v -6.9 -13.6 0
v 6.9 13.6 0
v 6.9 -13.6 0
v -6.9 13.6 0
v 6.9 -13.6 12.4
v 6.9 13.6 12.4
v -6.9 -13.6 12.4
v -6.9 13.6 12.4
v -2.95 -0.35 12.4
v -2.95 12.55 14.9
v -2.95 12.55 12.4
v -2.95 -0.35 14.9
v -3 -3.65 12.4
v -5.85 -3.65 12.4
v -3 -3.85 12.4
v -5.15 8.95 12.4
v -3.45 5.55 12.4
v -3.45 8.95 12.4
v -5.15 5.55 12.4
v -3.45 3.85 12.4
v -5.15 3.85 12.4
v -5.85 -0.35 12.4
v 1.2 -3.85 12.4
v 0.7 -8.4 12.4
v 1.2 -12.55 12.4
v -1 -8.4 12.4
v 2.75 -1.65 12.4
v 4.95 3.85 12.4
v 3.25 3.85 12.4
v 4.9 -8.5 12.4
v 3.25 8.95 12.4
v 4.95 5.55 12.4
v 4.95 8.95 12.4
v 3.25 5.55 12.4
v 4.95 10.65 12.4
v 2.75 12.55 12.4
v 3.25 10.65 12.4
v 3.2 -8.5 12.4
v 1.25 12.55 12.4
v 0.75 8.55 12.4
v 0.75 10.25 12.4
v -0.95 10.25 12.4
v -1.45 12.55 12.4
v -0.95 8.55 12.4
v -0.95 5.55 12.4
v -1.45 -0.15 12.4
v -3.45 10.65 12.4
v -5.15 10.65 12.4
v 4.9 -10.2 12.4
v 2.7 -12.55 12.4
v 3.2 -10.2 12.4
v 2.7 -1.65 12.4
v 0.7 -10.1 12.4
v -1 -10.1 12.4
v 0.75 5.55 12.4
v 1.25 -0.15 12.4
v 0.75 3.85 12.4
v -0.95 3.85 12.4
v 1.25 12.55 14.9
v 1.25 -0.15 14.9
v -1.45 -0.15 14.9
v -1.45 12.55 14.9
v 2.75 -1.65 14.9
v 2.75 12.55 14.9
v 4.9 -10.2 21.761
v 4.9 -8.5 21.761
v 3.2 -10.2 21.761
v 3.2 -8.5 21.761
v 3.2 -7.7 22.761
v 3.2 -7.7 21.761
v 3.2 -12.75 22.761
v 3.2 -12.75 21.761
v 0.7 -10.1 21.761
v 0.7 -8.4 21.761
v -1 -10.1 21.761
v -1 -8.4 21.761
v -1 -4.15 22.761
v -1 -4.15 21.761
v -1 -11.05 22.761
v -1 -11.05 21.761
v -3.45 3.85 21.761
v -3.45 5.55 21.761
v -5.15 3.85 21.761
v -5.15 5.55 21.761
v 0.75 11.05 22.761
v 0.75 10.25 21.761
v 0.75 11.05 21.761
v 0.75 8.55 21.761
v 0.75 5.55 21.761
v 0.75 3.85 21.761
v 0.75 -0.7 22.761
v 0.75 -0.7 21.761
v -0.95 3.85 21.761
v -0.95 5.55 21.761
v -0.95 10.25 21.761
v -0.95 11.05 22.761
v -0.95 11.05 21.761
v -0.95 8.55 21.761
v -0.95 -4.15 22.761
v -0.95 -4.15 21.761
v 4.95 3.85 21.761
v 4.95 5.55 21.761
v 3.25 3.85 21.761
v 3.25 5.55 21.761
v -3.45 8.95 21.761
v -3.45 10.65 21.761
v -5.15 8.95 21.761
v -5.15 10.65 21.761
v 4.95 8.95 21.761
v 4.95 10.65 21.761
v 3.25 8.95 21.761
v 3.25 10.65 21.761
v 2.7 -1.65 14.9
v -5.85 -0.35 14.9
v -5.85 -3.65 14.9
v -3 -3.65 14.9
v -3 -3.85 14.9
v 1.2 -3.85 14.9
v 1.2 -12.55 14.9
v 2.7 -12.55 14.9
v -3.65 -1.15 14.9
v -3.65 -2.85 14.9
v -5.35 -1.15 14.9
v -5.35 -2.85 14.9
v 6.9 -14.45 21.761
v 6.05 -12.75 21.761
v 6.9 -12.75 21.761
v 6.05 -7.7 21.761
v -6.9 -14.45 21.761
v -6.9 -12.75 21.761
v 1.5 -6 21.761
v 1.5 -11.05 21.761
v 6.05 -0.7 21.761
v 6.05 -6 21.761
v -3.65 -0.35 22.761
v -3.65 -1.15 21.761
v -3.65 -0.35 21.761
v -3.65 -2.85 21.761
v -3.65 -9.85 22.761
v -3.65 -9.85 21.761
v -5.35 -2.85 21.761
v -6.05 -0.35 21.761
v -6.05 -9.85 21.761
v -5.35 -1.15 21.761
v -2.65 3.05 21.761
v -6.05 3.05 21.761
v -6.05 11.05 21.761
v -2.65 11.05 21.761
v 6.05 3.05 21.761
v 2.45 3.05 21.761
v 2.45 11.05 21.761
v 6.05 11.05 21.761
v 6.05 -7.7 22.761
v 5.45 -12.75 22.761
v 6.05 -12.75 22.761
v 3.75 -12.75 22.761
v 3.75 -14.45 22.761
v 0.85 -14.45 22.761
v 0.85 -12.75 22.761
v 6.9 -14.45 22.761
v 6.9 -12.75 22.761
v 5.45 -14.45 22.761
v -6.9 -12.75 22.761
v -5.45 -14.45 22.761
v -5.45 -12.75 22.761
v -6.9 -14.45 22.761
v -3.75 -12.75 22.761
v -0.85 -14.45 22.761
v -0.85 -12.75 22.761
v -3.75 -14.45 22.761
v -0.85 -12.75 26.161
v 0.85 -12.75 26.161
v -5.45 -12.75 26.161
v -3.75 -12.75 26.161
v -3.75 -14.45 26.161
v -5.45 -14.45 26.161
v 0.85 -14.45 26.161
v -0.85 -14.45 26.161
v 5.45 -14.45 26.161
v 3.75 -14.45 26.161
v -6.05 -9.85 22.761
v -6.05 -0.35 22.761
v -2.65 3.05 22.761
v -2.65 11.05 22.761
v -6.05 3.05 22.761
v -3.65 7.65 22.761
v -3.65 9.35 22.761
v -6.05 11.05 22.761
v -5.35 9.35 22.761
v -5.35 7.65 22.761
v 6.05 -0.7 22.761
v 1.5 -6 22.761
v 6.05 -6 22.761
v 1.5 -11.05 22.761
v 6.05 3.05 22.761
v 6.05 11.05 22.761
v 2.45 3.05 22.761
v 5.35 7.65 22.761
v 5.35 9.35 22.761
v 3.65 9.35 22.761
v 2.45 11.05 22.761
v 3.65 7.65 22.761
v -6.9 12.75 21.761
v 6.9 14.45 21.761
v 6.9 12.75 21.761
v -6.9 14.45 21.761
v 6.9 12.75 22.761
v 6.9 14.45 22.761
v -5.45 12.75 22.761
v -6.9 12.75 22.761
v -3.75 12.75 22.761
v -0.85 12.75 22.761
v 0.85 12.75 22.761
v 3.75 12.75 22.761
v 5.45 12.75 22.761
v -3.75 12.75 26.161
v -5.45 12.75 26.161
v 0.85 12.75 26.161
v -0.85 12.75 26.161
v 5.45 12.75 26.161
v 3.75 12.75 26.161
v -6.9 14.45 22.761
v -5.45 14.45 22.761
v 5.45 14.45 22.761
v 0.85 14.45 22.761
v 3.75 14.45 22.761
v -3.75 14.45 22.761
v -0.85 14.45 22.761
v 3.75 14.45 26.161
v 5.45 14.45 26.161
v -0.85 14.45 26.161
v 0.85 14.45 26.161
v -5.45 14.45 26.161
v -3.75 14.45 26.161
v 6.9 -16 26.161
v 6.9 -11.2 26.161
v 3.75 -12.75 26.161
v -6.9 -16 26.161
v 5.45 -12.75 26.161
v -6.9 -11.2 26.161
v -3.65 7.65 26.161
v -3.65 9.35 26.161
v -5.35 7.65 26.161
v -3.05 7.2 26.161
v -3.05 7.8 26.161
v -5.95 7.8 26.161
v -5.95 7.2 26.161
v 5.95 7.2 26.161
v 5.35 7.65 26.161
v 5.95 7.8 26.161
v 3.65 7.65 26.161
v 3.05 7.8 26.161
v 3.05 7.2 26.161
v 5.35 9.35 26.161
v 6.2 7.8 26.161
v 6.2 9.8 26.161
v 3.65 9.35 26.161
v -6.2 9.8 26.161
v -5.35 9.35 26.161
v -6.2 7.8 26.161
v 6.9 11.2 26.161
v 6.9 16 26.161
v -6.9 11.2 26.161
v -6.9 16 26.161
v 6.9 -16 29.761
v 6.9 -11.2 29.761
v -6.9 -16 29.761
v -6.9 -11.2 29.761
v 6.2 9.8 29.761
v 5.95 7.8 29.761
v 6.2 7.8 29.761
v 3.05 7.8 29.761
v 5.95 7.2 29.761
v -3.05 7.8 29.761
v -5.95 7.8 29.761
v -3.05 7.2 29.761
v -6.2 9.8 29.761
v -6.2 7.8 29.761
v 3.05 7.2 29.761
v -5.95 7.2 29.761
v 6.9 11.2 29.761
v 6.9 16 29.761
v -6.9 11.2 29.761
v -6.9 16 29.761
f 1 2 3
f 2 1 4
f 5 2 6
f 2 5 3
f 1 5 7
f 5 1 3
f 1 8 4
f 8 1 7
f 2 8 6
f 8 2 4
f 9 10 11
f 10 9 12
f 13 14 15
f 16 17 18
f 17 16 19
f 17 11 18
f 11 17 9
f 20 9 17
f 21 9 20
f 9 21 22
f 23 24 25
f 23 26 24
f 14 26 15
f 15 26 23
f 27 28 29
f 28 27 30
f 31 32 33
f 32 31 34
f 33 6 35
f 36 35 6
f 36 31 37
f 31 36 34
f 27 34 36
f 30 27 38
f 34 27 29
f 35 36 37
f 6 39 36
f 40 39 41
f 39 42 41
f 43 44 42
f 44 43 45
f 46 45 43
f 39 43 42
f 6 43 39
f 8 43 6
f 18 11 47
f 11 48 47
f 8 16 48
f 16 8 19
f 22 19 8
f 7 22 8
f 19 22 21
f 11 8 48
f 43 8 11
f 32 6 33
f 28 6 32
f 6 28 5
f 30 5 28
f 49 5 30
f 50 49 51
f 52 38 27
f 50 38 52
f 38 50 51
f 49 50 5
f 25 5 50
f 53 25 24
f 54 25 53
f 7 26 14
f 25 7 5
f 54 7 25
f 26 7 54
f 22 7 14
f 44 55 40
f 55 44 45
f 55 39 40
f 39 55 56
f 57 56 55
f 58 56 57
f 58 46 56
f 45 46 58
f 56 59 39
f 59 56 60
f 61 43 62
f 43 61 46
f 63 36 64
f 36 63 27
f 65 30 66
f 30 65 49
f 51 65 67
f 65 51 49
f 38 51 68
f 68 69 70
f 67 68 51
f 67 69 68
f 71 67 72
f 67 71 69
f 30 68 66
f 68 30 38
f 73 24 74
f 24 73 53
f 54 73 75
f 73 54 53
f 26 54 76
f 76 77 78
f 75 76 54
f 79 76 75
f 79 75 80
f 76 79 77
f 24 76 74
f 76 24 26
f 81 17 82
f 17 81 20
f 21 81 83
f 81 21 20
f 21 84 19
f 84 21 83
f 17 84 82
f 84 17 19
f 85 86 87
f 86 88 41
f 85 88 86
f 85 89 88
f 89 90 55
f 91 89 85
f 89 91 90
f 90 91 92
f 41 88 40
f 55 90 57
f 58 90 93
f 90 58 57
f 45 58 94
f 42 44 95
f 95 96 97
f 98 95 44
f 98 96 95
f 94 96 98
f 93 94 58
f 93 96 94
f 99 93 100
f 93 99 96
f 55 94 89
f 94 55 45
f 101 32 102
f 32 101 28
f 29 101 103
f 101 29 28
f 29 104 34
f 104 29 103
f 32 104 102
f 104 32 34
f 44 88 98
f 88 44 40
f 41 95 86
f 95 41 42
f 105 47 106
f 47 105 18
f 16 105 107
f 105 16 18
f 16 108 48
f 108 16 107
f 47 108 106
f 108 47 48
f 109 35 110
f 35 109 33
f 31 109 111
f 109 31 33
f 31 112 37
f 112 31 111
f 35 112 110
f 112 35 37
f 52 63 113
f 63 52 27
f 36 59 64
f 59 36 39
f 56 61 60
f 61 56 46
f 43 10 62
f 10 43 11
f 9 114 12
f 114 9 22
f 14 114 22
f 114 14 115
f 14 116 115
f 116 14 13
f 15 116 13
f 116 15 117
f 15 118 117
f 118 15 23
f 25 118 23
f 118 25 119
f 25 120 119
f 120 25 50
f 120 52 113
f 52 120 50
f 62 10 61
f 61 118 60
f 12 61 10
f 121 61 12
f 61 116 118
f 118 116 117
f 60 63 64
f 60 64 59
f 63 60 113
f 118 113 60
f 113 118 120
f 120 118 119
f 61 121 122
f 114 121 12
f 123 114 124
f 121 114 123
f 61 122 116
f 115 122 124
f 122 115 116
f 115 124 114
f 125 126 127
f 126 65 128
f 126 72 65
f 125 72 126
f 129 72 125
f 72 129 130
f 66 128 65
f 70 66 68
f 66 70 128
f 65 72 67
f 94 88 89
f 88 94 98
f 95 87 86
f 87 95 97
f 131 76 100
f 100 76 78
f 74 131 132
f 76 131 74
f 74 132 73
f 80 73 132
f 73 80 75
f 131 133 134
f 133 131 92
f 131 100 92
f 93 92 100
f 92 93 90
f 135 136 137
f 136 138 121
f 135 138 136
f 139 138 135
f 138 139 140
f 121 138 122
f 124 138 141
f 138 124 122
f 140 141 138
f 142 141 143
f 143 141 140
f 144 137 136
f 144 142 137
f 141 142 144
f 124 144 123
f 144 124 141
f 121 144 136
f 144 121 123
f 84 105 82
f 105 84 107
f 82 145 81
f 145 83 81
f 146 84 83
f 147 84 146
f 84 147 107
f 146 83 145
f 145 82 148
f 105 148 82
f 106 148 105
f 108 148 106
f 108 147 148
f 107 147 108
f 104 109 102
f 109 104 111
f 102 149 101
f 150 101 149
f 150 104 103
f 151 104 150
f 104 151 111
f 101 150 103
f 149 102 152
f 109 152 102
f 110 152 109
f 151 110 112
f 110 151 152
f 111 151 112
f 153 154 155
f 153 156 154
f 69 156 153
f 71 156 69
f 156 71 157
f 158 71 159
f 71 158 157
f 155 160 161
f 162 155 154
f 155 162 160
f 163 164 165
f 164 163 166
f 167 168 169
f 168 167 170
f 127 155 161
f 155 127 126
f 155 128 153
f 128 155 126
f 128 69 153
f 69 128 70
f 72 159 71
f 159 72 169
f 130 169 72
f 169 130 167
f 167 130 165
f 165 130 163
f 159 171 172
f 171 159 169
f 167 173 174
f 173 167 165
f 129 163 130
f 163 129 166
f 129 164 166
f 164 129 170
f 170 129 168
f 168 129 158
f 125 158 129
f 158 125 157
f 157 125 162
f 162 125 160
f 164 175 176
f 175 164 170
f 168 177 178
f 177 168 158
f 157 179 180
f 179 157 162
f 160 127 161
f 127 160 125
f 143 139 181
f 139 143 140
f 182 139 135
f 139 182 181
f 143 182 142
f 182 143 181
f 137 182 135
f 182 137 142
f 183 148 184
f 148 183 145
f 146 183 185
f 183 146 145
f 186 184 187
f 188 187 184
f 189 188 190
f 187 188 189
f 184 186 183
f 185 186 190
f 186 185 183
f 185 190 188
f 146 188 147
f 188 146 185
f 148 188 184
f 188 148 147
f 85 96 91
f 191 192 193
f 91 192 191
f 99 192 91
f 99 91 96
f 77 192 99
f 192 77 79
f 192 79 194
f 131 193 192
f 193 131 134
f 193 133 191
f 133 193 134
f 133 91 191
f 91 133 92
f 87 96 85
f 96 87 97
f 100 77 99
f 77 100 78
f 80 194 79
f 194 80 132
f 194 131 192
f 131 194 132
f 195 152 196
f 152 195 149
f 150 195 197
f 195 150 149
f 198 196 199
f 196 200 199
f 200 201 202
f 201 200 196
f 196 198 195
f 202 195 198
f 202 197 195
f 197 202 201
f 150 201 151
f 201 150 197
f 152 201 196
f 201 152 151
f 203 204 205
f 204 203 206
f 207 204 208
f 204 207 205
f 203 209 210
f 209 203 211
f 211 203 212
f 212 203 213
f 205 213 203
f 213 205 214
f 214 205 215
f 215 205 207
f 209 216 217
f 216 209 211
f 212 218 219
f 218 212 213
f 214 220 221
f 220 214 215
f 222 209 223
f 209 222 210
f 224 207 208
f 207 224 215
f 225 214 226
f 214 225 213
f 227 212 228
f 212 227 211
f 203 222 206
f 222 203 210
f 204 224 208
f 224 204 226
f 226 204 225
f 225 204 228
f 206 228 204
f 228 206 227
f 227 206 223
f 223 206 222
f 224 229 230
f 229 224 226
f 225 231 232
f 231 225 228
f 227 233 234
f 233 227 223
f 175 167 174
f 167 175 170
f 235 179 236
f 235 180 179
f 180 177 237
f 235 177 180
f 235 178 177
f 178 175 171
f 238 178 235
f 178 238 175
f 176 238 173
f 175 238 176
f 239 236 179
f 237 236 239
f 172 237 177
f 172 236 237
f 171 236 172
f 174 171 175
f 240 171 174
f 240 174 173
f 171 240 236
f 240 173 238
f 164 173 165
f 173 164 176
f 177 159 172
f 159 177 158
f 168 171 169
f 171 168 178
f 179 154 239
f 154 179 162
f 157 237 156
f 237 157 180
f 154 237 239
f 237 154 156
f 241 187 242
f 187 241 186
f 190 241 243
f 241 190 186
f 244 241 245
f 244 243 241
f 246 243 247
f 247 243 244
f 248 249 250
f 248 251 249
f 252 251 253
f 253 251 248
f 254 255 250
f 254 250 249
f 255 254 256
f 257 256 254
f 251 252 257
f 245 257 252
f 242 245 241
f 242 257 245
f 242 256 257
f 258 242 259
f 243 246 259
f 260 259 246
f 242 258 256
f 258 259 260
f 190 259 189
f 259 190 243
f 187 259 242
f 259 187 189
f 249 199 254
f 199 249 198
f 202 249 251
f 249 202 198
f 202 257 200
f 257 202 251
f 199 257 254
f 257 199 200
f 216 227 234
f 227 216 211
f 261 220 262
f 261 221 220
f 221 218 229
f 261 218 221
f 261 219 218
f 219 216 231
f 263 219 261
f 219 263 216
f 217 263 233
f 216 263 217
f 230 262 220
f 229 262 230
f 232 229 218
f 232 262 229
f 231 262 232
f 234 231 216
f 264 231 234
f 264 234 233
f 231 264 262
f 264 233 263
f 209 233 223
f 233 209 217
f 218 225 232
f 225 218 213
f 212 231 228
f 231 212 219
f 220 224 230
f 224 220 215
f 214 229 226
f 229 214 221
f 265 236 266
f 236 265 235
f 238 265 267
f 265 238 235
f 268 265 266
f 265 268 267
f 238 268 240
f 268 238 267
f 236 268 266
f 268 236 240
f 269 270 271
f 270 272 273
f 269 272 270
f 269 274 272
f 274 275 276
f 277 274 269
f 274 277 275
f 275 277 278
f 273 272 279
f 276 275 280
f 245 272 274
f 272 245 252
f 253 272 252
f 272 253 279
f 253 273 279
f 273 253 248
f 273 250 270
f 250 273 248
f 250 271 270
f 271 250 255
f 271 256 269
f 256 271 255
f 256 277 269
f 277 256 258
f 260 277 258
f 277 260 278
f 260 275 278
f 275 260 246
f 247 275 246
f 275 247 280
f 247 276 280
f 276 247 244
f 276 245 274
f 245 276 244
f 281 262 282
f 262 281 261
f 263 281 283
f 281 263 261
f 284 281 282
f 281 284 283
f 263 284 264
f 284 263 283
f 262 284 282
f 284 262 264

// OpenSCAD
// Generated by SolidPython 0.4.2 on 2020-09-29 23:21:03
//!OpenSCAD

scale(v = 0.0100000000) {
	translate(v = [-690, -1360, 0]) {
		union() {
			color(c = [0.4000000000, 0.4000000000, 0.4000000000]) {
				translate(v = [0, 0, 0]) {
					linear_extrude(height = 1000.0000000000) {
						polygon(paths = [[0, 1, 2, 3]], points = [[0, 0], [0, 2720], [1380, 2720], [1380, 0]]);
					}
				}
			}
			color(c = [0.2000000000, 0.6000000000, 0.2000000000]) {
				translate(v = [0, 0, 1000.0000000000]) {
					linear_extrude(height = 120.0000000000) {
						polygon(paths = [[0, 1, 2, 3]], points = [[0, 1305], [0, 2720], [1380, 2720], [1380, 1305]]);
					}
				}
			}
			color(c = [0.4000000000, 0.4000000000, 0.4000000000]) {
				translate(v = [0, 0, 1000.0000000000]) {
					linear_extrude(height = 120.0000000000) {
						polygon(paths = [[0, 1, 2, 3]], points = [[0, 0], [0, 1305], [1380, 1305], [1380, 0]]);
					}
				}
			}
			color(c = [0.9000000000, 0.6000000000, 0.6000000000]) {
				translate(v = [0, 0, 1120.0000000000]) {
					linear_extrude(height = 120.0000000000) {
						polygon(paths = [[0, 1, 2, 3]], points = [[135, 1645], [135, 2485], [395, 2485], [395, 1645]]);
					}
				}
			}
			color(c = [0.9000000000, 0.6000000000, 0.6000000000]) {
				translate(v = [0, 0, 1120.0000000000]) {
					linear_extrude(height = 120.0000000000) {
						polygon(paths = [[0, 1, 2, 3]], points = [[545, 1645], [545, 2485], [815, 2485], [815, 1645]]);
					}
				}
			}
			color(c = [0.9000000000, 0.6000000000, 0.6000000000]) {
				translate(v = [0, 0, 1120.0000000000]) {
					linear_extrude(height = 120.0000000000) {
						polygon(paths = [[0, 1, 2, 3]], points = [[965, 1645], [965, 2485], [1245, 2485], [1245, 1645]]);
					}
				}
			}
			color(c = [0.9000000000, 0.6000000000, 0.9000000000]) {
				translate(v = [0, 0, 1120.0000000000]) {
					linear_extrude(height = 120.0000000000) {
						polygon(paths = [[0, 1, 2, 3]], points = [[550, 235], [550, 655], [810, 655], [810, 235]]);
					}
				}
			}
			color(c = [0.9000000000, 0.6000000000, 0.9000000000]) {
				translate(v = [0, 0, 1120.0000000000]) {
					linear_extrude(height = 120.0000000000) {
						polygon(paths = [[0, 1, 2, 3]], points = [[960, 235], [960, 655], [1245, 655], [1245, 235]]);
					}
				}
			}
			color(c = [0.2000000000, 0.6000000000, 0.2000000000]) {
				translate(v = [0, 0, 1120.0000000000]) {
					linear_extrude(height = 120.0000000000) {
						difference() {
							polygon(paths = [[0, 1, 2, 3]], points = [[0, 1305], [0, 2720], [1380, 2720], [1380, 1305]]);
							polygon(paths = [[0, 1, 2, 3]], points = [[135, 1645], [395, 1645], [395, 2485], [135, 2485]]);
							polygon(paths = [[0, 1, 2, 3]], points = [[545, 1645], [815, 1645], [815, 2485], [545, 2485]]);
							polygon(paths = [[0, 1, 2, 3]], points = [[965, 1645], [1245, 1645], [1245, 2485], [965, 2485]]);
						}
					}
				}
			}
			color(c = [0.4000000000, 0.4000000000, 0.4000000000]) {
				translate(v = [0, 0, 1120.0000000000]) {
					linear_extrude(height = 120.0000000000) {
						difference() {
							polygon(paths = [[0, 1, 2, 3]], points = [[0, 0], [0, 1305], [1380, 1305], [1380, 0]]);
							polygon(paths = [[0, 1, 2, 3]], points = [[550, 235], [810, 235], [810, 655], [550, 655]]);
							polygon(paths = [[0, 1, 2, 3]], points = [[960, 235], [1245, 235], [1245, 655], [960, 655]]);
						}
					}
				}
			}
			color(c = [0.1000000000, 0.1000000000, 0.1000000000]) {
				translate(v = [0, 0, 1240.0000000000]) {
					linear_extrude(height = 70.0000000000) {
						polygon(paths = [[0, 1, 2, 3]], points = [[1010, 340], [1010, 510], [1180, 510], [1180, 340]]);
					}
				}
			}
			color(c = [0.1000000000, 0.1000000000, 0.1000000000]) {
				translate(v = [0, 0, 1240.0000000000]) {
					linear_extrude(height = 70.0000000000) {
						polygon(paths = [[0, 1, 2, 3]], points = [[590, 350], [590, 520], [760, 520], [760, 350]]);
					}
				}
			}
			color(c = [0.1000000000, 0.1000000000, 0.1000000000]) {
				translate(v = [0, 0, 1240.0000000000]) {
					linear_extrude(height = 70.0000000000) {
						polygon(paths = [[0, 1, 2, 3]], points = [[175, 1745], [175, 1915], [345, 1915], [345, 1745]]);
					}
				}
			}
			color(c = [0.1000000000, 0.1000000000, 0.1000000000]) {
				translate(v = [0, 0, 1240.0000000000]) {
					linear_extrude(height = 70.0000000000) {
						polygon(paths = [[0, 1, 2, 3]], points = [[595, 1745], [595, 1915], [765, 1915], [765, 1745]]);
					}
				}
			}
			color(c = [0.1000000000, 0.1000000000, 0.1000000000]) {
				translate(v = [0, 0, 1240.0000000000]) {
					linear_extrude(height = 70.0000000000) {
						polygon(paths = [[0, 1, 2, 3]], points = [[1015, 1745], [1015, 1915], [1185, 1915], [1185, 1745]]);
					}
				}
			}
			color(c = [0.1000000000, 0.1000000000, 0.1000000000]) {
				translate(v = [0, 0, 1240.0000000000]) {
					linear_extrude(height = 70.0000000000) {
						polygon(paths = [[0, 1, 2, 3]], points = [[595, 2215], [595, 2385], [765, 2385], [765, 2215]]);
					}
				}
			}
			color(c = [0.1000000000, 0.1000000000, 0.1000000000]) {
				translate(v = [0, 0, 1240.0000000000]) {
					linear_extrude(height = 70.0000000000) {
						polygon(paths = [[0, 1, 2, 3]], points = [[175, 2255], [175, 2425], [345, 2425], [345, 2255]]);
					}
				}
			}
			color(c = [0.1000000000, 0.1000000000, 0.1000000000]) {
				translate(v = [0, 0, 1240.0000000000]) {
					linear_extrude(height = 70.0000000000) {
						polygon(paths = [[0, 1, 2, 3]], points = [[1015, 2255], [1015, 2425], [1185, 2425], [1185, 2255]]);
					}
				}
			}
			color(c = [1.0000000000, 1.0000000000, 1.0000000000]) {
				translate(v = [0, 0, 1240.0000000000]) {
					linear_extrude(height = 70.0000000000) {
						polygon(paths = [[0, 1, 2, 3, 4, 5, 6, 7, 8, 9, 10, 11, 12, 13, 14, 15]], points = [[810, 105], [810, 975], [390, 975], [390, 995], [105, 995], [105, 1325], [395, 1325], [395, 2615], [545, 2615], [545, 1345], [815, 1345], [815, 2615], [965, 2615], [965, 1195], [960, 1195], [960, 105]]);
					}
				}
			}
			color(c = [0.1000000000, 0.1000000000, 0.1000000000]) {
				translate(v = [0, 0, 1310.0000000000]) {
					linear_extrude(height = 180.0000000000) {
						polygon(paths = [[0, 1, 2, 3]], points = [[1010, 340], [1010, 510], [1180, 510], [1180, 340]]);
					}
				}
			}
			color(c = [0.1000000000, 0.1000000000, 0.1000000000]) {
				translate(v = [0, 0, 1310.0000000000]) {
					linear_extrude(height = 180.0000000000) {
						polygon(paths = [[0, 1, 2, 3]], points = [[590, 350], [590, 520], [760, 520], [760, 350]]);
					}
				}
			}
			color(c = [0.1000000000, 0.1000000000, 0.1000000000]) {
				translate(v = [0, 0, 1310.0000000000]) {
					linear_extrude(height = 180.0000000000) {
						polygon(paths = [[0, 1, 2, 3]], points = [[175, 1745], [175, 1915], [345, 1915], [345, 1745]]);
					}
				}
			}
			color(c = [0.1000000000, 0.1000000000, 0.1000000000]) {
				translate(v = [0, 0, 1310.0000000000]) {
					linear_extrude(height = 180.0000000000) {
						polygon(paths = [[0, 1, 2, 3]], points = [[595, 1745], [595, 1915], [765, 1915], [765, 1745]]);
					}
				}
			}
			color(c = [0.1000000000, 0.1000000000, 0.1000000000]) {
				translate(v = [0, 0, 1310.0000000000]) {
					linear_extrude(height = 180.0000000000) {
						polygon(paths = [[0, 1, 2, 3]], points = [[1015, 1745], [1015, 1915], [1185, 1915], [1185, 1745]]);
					}
				}
			}
			color(c = [0.1000000000, 0.1000000000, 0.1000000000]) {
				translate(v = [0, 0, 1310.0000000000]) {
					linear_extrude(height = 180.0000000000) {
						polygon(paths = [[0, 1, 2, 3]], points = [[595, 2215], [595, 2385], [765, 2385], [765, 2215]]);
					}
				}
			}
			color(c = [0.1000000000, 0.1000000000, 0.1000000000]) {
				translate(v = [0, 0, 1310.0000000000]) {
					linear_extrude(height = 180.0000000000) {
						polygon(paths = [[0, 1, 2, 3]], points = [[175, 2255], [175, 2425], [345, 2425], [345, 2255]]);
					}
				}
			}
			color(c = [0.1000000000, 0.1000000000, 0.1000000000]) {
				translate(v = [0, 0, 1310.0000000000]) {
					linear_extrude(height = 180.0000000000) {
						polygon(paths = [[0, 1, 2, 3]], points = [[1015, 2255], [1015, 2425], [1185, 2425], [1185, 2255]]);
					}
				}
			}
			color(c = [0.7000000000, 0, 0]) {
				translate(v = [0, 0, 1310.0000000000]) {
					linear_extrude(height = 180.0000000000) {
						polygon(paths = [[0, 1, 2, 3, 4, 5, 6, 7, 8, 9, 10, 11, 12, 13, 14, 15]], points = [[810, 105], [810, 975], [390, 975], [390, 995], [105, 995], [105, 1325], [395, 1325], [395, 2615], [545, 2615], [545, 1345], [815, 1345], [815, 2615], [965, 2615], [965, 1195], [960, 1195], [960, 105]]);
					}
				}
			}
			color(c = [0.1000000000, 0.1000000000, 0.1000000000]) {
				translate(v = [0, 0, 1490.0000000000]) {
					linear_extrude(height = 686.1000000000) {
						polygon(paths = [[0, 1, 2, 3]], points = [[1010, 340], [1010, 510], [1180, 510], [1180, 340]]);
					}
				}
			}
			color(c = [0.1000000000, 0.1000000000, 0.1000000000]) {
				translate(v = [0, 0, 1490.0000000000]) {
					linear_extrude(height = 686.1000000000) {
						polygon(paths = [[0, 1, 2, 3]], points = [[590, 350], [590, 520], [760, 520], [760, 350]]);
					}
				}
			}
			color(c = [0.1000000000, 0.1000000000, 0.1000000000]) {
				translate(v = [0, 0, 1490.0000000000]) {
					linear_extrude(height = 686.1000000000) {
						polygon(paths = [[0, 1, 2, 3]], points = [[155, 1075], [155, 1245], [325, 1245], [325, 1075]]);
					}
				}
			}
			color(c = [0.1000000000, 0.1000000000, 0.1000000000]) {
				translate(v = [0, 0, 1490.0000000000]) {
					linear_extrude(height = 686.1000000000) {
						polygon(paths = [[0, 1, 2, 3]], points = [[175, 1745], [175, 1915], [345, 1915], [345, 1745]]);
					}
				}
			}
			color(c = [0.1000000000, 0.1000000000, 0.1000000000]) {
				translate(v = [0, 0, 1490.0000000000]) {
					linear_extrude(height = 686.1000000000) {
						polygon(paths = [[0, 1, 2, 3]], points = [[595, 1745], [595, 1915], [765, 1915], [765, 1745]]);
					}
				}
			}
			color(c = [0.1000000000, 0.1000000000, 0.1000000000]) {
				translate(v = [0, 0, 1490.0000000000]) {
					linear_extrude(height = 686.1000000000) {
						polygon(paths = [[0, 1, 2, 3]], points = [[1015, 1745], [1015, 1915], [1185, 1915], [1185, 1745]]);
					}
				}
			}
			color(c = [0.1000000000, 0.1000000000, 0.1000000000]) {
				translate(v = [0, 0, 1490.0000000000]) {
					linear_extrude(height = 686.1000000000) {
						polygon(paths = [[0, 1, 2, 3]], points = [[595, 2215], [595, 2385], [765, 2385], [765, 2215]]);
					}
				}
			}
			color(c = [0.1000000000, 0.1000000000, 0.1000000000]) {
				translate(v = [0, 0, 1490.0000000000]) {
					linear_extrude(height = 686.1000000000) {
						polygon(paths = [[0, 1, 2, 3]], points = [[175, 2255], [175, 2425], [345, 2425], [345, 2255]]);
					}
				}
			}
			color(c = [0.1000000000, 0.1000000000, 0.1000000000]) {
				translate(v = [0, 0, 1490.0000000000]) {
					linear_extrude(height = 686.1000000000) {
						polygon(paths = [[0, 1, 2, 3]], points = [[1015, 2255], [1015, 2425], [1185, 2425], [1185, 2255]]);
					}
				}
			}
			color(c = [0.9000000000, 0.6000000000, 0.6000000000]) {
				translate(v = [0, 0, 2176.1000000000]) {
					linear_extrude(height = 100.0000000000) {
						polygon(paths = [[0, 1, 2, 3, 4, 5, 6, 7]], points = [[0, -85], [0, 85], [1010, 85], [1010, 590], [1295, 590], [1295, 85], [1380, 85], [1380, -85]]);
					}
				}
			}
			color(c = [0.9000000000, 0.6000000000, 0.6000000000]) {
				translate(v = [0, 0, 2176.1000000000]) {
					linear_extrude(height = 100.0000000000) {
						polygon(paths = [[0, 1, 2, 3]], points = [[85, 375], [85, 1325], [325, 1325], [325, 375]]);
					}
				}
			}
			color(c = [0.9000000000, 0.6000000000, 0.6000000000]) {
				translate(v = [0, 0, 2176.1000000000]) {
					linear_extrude(height = 100.0000000000) {
						polygon(paths = [[0, 1, 2, 3]], points = [[85, 1665], [85, 2465], [425, 2465], [425, 1665]]);
					}
				}
			}
			color(c = [0.9000000000, 0.6000000000, 0.6000000000]) {
				translate(v = [0, 0, 2176.1000000000]) {
					linear_extrude(height = 100.0000000000) {
						polygon(paths = [[0, 1, 2, 3, 4, 5, 6, 7, 8, 9]], points = [[590, 255], [590, 945], [595, 945], [595, 2465], [765, 2465], [765, 1290], [1295, 1290], [1295, 760], [840, 760], [840, 255]]);
					}
				}
			}
			color(c = [0.9000000000, 0.6000000000, 0.6000000000]) {
				translate(v = [0, 0, 2176.1000000000]) {
					linear_extrude(height = 100.0000000000) {
						polygon(paths = [[0, 1, 2, 3]], points = [[935, 1665], [935, 2465], [1295, 2465], [1295, 1665]]);
					}
				}
			}
			color(c = [0.9000000000, 0.6000000000, 0.6000000000]) {
				translate(v = [0, 0, 2176.1000000000]) {
					linear_extrude(height = 100.0000000000) {
						polygon(paths = [[0, 1, 2, 3]], points = [[0, 2635], [0, 2805], [1380, 2805], [1380, 2635]]);
					}
				}
			}
			color(c = [0.5000000000, 0.5000000000, 0.5000000000]) {
				translate(v = [0, 0, 2276.1000000000]) {
					linear_extrude(height = 340.0000000000) {
						polygon(paths = [[0, 1, 2, 3]], points = [[145, -85], [145, 85], [315, 85], [315, -85]]);
					}
				}
			}
			color(c = [0.5000000000, 0.5000000000, 0.5000000000]) {
				translate(v = [0, 0, 2276.1000000000]) {
					linear_extrude(height = 340.0000000000) {
						polygon(paths = [[0, 1, 2, 3]], points = [[605, -85], [605, 85], [775, 85], [775, -85]]);
					}
				}
			}
			color(c = [0.5000000000, 0.5000000000, 0.5000000000]) {
				translate(v = [0, 0, 2276.1000000000]) {
					linear_extrude(height = 340.0000000000) {
						polygon(paths = [[0, 1, 2, 3]], points = [[1065, -85], [1065, 85], [1235, 85], [1235, -85]]);
					}
				}
			}
			color(c = [0.5000000000, 0.5000000000, 0.5000000000]) {
				translate(v = [0, 0, 2276.1000000000]) {
					linear_extrude(height = 340.0000000000) {
						polygon(paths = [[0, 1, 2, 3]], points = [[155, 2125], [155, 2295], [325, 2295], [325, 2125]]);
					}
				}
			}
			color(c = [0.5000000000, 0.5000000000, 0.5000000000]) {
				translate(v = [0, 0, 2276.1000000000]) {
					linear_extrude(height = 340.0000000000) {
						polygon(paths = [[0, 1, 2, 3]], points = [[1055, 2125], [1055, 2295], [1225, 2295], [1225, 2125]]);
					}
				}
			}
			color(c = [0.5000000000, 0.5000000000, 0.5000000000]) {
				translate(v = [0, 0, 2276.1000000000]) {
					linear_extrude(height = 340.0000000000) {
						polygon(paths = [[0, 1, 2, 3]], points = [[145, 2635], [145, 2805], [315, 2805], [315, 2635]]);
					}
				}
			}
			color(c = [0.5000000000, 0.5000000000, 0.5000000000]) {
				translate(v = [0, 0, 2276.1000000000]) {
					linear_extrude(height = 340.0000000000) {
						polygon(paths = [[0, 1, 2, 3]], points = [[605, 2635], [605, 2805], [775, 2805], [775, 2635]]);
					}
				}
			}
			color(c = [0.5000000000, 0.5000000000, 0.5000000000]) {
				translate(v = [0, 0, 2276.1000000000]) {
					linear_extrude(height = 340.0000000000) {
						polygon(paths = [[0, 1, 2, 3]], points = [[1065, 2635], [1065, 2805], [1235, 2805], [1235, 2635]]);
					}
				}
			}
			color(c = [0.3000000000, 0.3000000000, 1]) {
				translate(v = [0, 0, 2616.1000000000]) {
					linear_extrude(height = 360.0000000000) {
						polygon(paths = [[0, 1, 2, 3]], points = [[0, -240], [0, 240], [1380, 240], [1380, -240]]);
					}
				}
			}
			color(c = [0.3000000000, 0.3000000000, 1]) {
				translate(v = [0, 0, 2616.1000000000]) {
					linear_extrude(height = 360.0000000000) {
						polygon(paths = [[0, 1, 2, 3, 4, 5, 6, 7, 8, 9, 10, 11]], points = [[95, 2080], [95, 2140], [70, 2140], [70, 2340], [1310, 2340], [1310, 2140], [1285, 2140], [1285, 2080], [995, 2080], [995, 2140], [385, 2140], [385, 2080]]);
					}
				}
			}
			color(c = [0.3000000000, 0.3000000000, 1]) {
				translate(v = [0, 0, 2616.1000000000]) {
					linear_extrude(height = 360.0000000000) {
						polygon(paths = [[0, 1, 2, 3]], points = [[0, 2480], [0, 2960], [1380, 2960], [1380, 2480]]);
					}
				}
			}
		}
	}
}
